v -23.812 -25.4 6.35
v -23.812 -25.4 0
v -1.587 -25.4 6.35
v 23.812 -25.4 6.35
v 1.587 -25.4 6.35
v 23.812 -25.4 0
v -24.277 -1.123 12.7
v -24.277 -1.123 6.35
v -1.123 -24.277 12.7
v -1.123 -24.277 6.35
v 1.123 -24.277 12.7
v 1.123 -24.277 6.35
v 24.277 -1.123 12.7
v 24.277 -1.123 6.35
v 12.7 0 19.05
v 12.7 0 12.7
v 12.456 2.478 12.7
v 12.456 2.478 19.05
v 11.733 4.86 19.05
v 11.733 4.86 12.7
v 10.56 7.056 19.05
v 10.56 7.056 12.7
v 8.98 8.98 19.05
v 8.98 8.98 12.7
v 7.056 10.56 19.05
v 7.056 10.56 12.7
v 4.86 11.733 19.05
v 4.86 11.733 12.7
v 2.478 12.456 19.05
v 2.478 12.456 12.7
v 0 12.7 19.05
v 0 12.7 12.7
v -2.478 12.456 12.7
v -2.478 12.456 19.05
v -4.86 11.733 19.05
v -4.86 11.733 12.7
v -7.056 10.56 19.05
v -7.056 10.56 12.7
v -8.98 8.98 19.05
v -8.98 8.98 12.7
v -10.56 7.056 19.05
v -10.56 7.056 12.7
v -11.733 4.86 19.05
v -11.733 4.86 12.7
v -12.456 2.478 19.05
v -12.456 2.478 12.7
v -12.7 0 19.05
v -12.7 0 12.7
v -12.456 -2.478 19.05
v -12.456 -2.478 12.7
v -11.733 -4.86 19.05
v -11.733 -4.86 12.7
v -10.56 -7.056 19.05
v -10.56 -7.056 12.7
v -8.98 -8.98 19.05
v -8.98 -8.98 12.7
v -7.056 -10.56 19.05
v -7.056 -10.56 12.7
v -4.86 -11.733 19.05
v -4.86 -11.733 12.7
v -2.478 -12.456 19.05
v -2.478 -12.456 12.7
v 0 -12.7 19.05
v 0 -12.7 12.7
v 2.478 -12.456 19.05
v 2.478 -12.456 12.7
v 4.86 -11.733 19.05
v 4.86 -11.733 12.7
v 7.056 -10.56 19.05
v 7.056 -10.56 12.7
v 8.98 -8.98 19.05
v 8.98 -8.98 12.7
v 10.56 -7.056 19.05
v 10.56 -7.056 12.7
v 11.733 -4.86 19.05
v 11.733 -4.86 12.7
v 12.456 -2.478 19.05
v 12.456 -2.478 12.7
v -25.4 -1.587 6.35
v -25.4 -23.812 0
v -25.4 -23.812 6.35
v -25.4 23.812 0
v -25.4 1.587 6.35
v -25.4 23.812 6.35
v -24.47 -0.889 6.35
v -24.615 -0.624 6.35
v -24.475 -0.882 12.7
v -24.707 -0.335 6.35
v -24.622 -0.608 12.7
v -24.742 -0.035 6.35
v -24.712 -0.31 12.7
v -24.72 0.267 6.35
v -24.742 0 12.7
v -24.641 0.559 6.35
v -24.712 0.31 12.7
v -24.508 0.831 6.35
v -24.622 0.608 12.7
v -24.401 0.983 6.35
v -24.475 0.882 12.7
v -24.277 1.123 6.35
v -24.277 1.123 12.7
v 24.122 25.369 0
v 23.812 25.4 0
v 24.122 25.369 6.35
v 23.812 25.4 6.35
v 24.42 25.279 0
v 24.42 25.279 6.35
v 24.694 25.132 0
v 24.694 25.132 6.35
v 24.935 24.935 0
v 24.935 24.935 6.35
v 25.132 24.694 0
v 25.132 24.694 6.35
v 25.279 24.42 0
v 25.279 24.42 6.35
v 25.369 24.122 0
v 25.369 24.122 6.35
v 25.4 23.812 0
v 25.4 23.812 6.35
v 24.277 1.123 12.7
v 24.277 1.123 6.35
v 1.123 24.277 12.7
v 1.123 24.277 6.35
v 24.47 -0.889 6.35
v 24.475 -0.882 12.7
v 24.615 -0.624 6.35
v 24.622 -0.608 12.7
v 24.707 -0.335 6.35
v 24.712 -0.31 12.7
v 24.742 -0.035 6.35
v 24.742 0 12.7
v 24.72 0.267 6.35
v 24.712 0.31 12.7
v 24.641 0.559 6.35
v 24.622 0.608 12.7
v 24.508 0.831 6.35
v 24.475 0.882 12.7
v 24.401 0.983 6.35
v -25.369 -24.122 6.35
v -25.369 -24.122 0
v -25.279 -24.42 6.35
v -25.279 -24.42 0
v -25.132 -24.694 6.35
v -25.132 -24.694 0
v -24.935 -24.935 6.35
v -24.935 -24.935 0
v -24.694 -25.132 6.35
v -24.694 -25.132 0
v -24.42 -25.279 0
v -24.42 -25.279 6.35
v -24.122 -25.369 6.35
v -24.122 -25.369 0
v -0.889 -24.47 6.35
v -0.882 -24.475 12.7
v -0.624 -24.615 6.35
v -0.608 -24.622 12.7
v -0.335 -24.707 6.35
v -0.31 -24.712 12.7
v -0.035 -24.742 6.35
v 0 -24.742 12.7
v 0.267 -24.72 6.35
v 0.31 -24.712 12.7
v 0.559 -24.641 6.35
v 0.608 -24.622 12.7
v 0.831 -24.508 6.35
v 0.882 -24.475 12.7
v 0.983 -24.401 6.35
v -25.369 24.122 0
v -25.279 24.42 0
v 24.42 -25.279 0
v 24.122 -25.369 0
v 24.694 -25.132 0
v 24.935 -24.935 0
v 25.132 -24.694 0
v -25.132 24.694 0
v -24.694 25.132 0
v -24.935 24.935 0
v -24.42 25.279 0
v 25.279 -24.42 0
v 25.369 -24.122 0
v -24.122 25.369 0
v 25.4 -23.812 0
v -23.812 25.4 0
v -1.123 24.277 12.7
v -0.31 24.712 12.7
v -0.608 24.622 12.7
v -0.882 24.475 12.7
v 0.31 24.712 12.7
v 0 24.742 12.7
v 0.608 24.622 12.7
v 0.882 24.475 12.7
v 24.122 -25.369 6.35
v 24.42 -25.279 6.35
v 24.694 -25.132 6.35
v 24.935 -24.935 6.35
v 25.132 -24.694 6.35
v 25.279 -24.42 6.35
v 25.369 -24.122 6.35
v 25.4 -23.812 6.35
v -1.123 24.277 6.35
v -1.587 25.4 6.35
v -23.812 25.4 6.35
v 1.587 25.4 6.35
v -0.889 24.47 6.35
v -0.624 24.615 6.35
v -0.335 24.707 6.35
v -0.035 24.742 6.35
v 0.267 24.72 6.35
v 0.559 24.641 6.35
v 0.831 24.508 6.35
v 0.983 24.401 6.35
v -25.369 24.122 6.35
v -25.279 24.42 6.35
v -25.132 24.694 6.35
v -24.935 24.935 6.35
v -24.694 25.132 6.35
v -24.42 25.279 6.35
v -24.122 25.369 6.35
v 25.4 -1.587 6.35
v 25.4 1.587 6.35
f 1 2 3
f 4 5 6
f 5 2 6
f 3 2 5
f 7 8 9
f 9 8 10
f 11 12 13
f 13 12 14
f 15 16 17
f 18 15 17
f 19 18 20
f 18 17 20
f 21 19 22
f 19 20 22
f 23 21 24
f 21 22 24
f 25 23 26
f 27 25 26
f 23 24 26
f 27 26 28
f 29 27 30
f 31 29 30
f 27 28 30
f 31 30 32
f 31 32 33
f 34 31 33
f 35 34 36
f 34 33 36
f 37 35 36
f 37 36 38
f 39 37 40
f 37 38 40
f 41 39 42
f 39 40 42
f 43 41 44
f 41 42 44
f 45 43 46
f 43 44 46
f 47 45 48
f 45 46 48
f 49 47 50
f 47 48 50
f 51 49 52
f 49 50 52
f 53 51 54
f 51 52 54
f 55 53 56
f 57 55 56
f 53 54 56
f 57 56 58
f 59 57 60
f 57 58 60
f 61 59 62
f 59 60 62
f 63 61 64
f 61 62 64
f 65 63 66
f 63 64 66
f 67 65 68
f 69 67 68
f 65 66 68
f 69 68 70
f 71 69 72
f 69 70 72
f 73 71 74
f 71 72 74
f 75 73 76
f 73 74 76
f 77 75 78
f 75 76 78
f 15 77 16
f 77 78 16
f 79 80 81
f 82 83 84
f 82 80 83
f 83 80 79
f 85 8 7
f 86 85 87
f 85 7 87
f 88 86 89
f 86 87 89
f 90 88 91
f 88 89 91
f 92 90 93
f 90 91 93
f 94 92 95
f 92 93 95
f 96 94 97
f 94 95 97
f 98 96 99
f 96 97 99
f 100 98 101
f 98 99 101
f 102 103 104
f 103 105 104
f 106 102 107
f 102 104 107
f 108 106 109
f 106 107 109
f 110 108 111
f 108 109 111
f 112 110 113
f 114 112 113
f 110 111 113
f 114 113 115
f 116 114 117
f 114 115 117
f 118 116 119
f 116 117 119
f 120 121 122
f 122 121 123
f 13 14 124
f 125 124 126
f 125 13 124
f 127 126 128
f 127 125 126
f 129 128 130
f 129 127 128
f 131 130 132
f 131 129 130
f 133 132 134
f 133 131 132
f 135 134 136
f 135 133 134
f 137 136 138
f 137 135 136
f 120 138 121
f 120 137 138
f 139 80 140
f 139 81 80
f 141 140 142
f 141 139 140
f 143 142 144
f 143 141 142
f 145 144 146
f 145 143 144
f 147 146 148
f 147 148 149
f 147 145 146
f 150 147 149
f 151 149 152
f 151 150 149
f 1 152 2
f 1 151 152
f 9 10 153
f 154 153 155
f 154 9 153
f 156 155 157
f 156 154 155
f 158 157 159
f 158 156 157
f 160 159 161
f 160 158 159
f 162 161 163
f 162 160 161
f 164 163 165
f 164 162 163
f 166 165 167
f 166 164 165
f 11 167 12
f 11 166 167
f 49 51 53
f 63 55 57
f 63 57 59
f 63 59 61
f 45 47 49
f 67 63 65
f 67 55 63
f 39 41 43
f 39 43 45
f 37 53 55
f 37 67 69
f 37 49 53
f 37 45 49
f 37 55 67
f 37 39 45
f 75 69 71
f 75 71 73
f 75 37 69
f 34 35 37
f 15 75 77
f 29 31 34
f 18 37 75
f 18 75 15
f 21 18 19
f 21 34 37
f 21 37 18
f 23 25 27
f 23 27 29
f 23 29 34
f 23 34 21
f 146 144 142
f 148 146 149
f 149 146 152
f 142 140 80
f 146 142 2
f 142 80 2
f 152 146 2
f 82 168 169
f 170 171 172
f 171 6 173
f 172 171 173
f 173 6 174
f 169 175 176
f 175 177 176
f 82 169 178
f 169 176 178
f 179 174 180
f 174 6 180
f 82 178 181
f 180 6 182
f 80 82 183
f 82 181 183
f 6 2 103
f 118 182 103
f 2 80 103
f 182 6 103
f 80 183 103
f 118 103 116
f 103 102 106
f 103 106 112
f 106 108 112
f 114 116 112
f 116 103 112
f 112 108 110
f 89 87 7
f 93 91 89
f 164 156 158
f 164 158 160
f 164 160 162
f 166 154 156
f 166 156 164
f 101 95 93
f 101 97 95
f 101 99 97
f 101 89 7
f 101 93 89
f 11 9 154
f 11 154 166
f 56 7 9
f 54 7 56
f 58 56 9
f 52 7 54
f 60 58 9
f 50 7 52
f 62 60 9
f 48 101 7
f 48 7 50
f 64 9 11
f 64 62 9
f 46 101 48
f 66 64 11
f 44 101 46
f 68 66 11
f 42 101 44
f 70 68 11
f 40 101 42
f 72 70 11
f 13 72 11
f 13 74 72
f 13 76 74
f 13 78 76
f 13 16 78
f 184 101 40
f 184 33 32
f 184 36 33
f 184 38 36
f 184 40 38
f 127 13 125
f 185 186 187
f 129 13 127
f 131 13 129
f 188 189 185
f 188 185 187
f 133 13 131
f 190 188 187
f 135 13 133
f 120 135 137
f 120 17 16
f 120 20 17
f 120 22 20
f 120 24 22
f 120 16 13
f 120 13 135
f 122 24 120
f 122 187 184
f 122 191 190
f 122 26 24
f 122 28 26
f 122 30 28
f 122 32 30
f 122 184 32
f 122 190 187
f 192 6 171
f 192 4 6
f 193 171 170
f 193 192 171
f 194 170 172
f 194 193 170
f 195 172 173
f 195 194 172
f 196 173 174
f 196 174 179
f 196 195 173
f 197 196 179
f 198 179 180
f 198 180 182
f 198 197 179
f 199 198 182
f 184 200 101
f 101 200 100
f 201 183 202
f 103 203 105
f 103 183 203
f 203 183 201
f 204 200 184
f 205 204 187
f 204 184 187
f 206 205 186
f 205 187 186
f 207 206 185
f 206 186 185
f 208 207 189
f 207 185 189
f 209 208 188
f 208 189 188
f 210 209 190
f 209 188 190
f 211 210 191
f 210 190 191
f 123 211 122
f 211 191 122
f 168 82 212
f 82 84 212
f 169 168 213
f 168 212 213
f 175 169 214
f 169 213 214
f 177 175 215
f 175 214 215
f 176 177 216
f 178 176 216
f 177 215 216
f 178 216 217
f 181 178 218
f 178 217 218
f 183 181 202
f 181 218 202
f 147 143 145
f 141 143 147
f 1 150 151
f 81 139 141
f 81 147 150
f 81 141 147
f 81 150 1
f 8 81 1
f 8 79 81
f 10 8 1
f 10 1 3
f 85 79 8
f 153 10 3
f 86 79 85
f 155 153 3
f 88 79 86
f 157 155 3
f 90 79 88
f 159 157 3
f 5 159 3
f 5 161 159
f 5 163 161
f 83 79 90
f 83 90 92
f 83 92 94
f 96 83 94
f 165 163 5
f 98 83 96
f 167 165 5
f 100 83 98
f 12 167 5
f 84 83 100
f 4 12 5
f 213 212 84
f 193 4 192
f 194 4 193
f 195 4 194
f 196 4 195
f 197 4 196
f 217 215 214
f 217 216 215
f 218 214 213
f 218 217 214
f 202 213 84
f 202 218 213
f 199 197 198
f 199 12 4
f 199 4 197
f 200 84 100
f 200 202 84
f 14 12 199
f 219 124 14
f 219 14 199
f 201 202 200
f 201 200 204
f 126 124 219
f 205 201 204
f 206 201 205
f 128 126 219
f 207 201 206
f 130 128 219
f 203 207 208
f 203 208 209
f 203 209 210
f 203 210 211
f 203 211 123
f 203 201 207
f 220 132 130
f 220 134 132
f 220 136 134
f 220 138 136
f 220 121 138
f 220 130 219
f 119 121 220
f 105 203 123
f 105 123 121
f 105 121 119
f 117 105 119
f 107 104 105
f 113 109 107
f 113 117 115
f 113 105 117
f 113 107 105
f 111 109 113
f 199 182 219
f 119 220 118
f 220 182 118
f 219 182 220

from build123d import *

# Parameters (mm, degrees)
F0_W     = 50.8
F0_H     = 50.8
F1_DEPTH = 6.35
F3_DEPTH = 6.35
F4_R     = 12.7
F5_DEPTH = 6.35
F6_R     = 1.5875


with BuildPart() as f1:
    # F0 (on Top) → F1 (new body)
    with BuildSketch(Plane.XY):
        Rectangle(F0_W, F0_H)
    extrude(amount=F1_DEPTH)

    # F2 (on face) → F3 (join)
    with BuildSketch(Plane.XY.offset(6.35)):
        Polygon((0, -25.4), (25.4, 0), (0, 25.4), (-25.4, 0), align=None)
    extrude(amount=F3_DEPTH)

    # F4 (on face) → F5 (join)
    with BuildSketch(Plane.XY.offset(12.7)):
        Circle(F4_R)
    extrude(amount=F5_DEPTH)

    # F6
    f6_edges = [f1.edges().sort_by_distance(p)[0] for p in [
        (-25.4, 0, 9.525),
        (25.4, 0, 9.525),
        (0, 25.4, 9.525),
        (0, -25.4, 9.525),
        (-25.4, 25.4, 3.175),
        (-25.4, -25.4, 3.175),
        (25.4, -25.4, 3.175),
        (25.4, 25.4, 3.175),
    ]]
    fillet(f6_edges, radius=F6_R)


solid = f1.part
